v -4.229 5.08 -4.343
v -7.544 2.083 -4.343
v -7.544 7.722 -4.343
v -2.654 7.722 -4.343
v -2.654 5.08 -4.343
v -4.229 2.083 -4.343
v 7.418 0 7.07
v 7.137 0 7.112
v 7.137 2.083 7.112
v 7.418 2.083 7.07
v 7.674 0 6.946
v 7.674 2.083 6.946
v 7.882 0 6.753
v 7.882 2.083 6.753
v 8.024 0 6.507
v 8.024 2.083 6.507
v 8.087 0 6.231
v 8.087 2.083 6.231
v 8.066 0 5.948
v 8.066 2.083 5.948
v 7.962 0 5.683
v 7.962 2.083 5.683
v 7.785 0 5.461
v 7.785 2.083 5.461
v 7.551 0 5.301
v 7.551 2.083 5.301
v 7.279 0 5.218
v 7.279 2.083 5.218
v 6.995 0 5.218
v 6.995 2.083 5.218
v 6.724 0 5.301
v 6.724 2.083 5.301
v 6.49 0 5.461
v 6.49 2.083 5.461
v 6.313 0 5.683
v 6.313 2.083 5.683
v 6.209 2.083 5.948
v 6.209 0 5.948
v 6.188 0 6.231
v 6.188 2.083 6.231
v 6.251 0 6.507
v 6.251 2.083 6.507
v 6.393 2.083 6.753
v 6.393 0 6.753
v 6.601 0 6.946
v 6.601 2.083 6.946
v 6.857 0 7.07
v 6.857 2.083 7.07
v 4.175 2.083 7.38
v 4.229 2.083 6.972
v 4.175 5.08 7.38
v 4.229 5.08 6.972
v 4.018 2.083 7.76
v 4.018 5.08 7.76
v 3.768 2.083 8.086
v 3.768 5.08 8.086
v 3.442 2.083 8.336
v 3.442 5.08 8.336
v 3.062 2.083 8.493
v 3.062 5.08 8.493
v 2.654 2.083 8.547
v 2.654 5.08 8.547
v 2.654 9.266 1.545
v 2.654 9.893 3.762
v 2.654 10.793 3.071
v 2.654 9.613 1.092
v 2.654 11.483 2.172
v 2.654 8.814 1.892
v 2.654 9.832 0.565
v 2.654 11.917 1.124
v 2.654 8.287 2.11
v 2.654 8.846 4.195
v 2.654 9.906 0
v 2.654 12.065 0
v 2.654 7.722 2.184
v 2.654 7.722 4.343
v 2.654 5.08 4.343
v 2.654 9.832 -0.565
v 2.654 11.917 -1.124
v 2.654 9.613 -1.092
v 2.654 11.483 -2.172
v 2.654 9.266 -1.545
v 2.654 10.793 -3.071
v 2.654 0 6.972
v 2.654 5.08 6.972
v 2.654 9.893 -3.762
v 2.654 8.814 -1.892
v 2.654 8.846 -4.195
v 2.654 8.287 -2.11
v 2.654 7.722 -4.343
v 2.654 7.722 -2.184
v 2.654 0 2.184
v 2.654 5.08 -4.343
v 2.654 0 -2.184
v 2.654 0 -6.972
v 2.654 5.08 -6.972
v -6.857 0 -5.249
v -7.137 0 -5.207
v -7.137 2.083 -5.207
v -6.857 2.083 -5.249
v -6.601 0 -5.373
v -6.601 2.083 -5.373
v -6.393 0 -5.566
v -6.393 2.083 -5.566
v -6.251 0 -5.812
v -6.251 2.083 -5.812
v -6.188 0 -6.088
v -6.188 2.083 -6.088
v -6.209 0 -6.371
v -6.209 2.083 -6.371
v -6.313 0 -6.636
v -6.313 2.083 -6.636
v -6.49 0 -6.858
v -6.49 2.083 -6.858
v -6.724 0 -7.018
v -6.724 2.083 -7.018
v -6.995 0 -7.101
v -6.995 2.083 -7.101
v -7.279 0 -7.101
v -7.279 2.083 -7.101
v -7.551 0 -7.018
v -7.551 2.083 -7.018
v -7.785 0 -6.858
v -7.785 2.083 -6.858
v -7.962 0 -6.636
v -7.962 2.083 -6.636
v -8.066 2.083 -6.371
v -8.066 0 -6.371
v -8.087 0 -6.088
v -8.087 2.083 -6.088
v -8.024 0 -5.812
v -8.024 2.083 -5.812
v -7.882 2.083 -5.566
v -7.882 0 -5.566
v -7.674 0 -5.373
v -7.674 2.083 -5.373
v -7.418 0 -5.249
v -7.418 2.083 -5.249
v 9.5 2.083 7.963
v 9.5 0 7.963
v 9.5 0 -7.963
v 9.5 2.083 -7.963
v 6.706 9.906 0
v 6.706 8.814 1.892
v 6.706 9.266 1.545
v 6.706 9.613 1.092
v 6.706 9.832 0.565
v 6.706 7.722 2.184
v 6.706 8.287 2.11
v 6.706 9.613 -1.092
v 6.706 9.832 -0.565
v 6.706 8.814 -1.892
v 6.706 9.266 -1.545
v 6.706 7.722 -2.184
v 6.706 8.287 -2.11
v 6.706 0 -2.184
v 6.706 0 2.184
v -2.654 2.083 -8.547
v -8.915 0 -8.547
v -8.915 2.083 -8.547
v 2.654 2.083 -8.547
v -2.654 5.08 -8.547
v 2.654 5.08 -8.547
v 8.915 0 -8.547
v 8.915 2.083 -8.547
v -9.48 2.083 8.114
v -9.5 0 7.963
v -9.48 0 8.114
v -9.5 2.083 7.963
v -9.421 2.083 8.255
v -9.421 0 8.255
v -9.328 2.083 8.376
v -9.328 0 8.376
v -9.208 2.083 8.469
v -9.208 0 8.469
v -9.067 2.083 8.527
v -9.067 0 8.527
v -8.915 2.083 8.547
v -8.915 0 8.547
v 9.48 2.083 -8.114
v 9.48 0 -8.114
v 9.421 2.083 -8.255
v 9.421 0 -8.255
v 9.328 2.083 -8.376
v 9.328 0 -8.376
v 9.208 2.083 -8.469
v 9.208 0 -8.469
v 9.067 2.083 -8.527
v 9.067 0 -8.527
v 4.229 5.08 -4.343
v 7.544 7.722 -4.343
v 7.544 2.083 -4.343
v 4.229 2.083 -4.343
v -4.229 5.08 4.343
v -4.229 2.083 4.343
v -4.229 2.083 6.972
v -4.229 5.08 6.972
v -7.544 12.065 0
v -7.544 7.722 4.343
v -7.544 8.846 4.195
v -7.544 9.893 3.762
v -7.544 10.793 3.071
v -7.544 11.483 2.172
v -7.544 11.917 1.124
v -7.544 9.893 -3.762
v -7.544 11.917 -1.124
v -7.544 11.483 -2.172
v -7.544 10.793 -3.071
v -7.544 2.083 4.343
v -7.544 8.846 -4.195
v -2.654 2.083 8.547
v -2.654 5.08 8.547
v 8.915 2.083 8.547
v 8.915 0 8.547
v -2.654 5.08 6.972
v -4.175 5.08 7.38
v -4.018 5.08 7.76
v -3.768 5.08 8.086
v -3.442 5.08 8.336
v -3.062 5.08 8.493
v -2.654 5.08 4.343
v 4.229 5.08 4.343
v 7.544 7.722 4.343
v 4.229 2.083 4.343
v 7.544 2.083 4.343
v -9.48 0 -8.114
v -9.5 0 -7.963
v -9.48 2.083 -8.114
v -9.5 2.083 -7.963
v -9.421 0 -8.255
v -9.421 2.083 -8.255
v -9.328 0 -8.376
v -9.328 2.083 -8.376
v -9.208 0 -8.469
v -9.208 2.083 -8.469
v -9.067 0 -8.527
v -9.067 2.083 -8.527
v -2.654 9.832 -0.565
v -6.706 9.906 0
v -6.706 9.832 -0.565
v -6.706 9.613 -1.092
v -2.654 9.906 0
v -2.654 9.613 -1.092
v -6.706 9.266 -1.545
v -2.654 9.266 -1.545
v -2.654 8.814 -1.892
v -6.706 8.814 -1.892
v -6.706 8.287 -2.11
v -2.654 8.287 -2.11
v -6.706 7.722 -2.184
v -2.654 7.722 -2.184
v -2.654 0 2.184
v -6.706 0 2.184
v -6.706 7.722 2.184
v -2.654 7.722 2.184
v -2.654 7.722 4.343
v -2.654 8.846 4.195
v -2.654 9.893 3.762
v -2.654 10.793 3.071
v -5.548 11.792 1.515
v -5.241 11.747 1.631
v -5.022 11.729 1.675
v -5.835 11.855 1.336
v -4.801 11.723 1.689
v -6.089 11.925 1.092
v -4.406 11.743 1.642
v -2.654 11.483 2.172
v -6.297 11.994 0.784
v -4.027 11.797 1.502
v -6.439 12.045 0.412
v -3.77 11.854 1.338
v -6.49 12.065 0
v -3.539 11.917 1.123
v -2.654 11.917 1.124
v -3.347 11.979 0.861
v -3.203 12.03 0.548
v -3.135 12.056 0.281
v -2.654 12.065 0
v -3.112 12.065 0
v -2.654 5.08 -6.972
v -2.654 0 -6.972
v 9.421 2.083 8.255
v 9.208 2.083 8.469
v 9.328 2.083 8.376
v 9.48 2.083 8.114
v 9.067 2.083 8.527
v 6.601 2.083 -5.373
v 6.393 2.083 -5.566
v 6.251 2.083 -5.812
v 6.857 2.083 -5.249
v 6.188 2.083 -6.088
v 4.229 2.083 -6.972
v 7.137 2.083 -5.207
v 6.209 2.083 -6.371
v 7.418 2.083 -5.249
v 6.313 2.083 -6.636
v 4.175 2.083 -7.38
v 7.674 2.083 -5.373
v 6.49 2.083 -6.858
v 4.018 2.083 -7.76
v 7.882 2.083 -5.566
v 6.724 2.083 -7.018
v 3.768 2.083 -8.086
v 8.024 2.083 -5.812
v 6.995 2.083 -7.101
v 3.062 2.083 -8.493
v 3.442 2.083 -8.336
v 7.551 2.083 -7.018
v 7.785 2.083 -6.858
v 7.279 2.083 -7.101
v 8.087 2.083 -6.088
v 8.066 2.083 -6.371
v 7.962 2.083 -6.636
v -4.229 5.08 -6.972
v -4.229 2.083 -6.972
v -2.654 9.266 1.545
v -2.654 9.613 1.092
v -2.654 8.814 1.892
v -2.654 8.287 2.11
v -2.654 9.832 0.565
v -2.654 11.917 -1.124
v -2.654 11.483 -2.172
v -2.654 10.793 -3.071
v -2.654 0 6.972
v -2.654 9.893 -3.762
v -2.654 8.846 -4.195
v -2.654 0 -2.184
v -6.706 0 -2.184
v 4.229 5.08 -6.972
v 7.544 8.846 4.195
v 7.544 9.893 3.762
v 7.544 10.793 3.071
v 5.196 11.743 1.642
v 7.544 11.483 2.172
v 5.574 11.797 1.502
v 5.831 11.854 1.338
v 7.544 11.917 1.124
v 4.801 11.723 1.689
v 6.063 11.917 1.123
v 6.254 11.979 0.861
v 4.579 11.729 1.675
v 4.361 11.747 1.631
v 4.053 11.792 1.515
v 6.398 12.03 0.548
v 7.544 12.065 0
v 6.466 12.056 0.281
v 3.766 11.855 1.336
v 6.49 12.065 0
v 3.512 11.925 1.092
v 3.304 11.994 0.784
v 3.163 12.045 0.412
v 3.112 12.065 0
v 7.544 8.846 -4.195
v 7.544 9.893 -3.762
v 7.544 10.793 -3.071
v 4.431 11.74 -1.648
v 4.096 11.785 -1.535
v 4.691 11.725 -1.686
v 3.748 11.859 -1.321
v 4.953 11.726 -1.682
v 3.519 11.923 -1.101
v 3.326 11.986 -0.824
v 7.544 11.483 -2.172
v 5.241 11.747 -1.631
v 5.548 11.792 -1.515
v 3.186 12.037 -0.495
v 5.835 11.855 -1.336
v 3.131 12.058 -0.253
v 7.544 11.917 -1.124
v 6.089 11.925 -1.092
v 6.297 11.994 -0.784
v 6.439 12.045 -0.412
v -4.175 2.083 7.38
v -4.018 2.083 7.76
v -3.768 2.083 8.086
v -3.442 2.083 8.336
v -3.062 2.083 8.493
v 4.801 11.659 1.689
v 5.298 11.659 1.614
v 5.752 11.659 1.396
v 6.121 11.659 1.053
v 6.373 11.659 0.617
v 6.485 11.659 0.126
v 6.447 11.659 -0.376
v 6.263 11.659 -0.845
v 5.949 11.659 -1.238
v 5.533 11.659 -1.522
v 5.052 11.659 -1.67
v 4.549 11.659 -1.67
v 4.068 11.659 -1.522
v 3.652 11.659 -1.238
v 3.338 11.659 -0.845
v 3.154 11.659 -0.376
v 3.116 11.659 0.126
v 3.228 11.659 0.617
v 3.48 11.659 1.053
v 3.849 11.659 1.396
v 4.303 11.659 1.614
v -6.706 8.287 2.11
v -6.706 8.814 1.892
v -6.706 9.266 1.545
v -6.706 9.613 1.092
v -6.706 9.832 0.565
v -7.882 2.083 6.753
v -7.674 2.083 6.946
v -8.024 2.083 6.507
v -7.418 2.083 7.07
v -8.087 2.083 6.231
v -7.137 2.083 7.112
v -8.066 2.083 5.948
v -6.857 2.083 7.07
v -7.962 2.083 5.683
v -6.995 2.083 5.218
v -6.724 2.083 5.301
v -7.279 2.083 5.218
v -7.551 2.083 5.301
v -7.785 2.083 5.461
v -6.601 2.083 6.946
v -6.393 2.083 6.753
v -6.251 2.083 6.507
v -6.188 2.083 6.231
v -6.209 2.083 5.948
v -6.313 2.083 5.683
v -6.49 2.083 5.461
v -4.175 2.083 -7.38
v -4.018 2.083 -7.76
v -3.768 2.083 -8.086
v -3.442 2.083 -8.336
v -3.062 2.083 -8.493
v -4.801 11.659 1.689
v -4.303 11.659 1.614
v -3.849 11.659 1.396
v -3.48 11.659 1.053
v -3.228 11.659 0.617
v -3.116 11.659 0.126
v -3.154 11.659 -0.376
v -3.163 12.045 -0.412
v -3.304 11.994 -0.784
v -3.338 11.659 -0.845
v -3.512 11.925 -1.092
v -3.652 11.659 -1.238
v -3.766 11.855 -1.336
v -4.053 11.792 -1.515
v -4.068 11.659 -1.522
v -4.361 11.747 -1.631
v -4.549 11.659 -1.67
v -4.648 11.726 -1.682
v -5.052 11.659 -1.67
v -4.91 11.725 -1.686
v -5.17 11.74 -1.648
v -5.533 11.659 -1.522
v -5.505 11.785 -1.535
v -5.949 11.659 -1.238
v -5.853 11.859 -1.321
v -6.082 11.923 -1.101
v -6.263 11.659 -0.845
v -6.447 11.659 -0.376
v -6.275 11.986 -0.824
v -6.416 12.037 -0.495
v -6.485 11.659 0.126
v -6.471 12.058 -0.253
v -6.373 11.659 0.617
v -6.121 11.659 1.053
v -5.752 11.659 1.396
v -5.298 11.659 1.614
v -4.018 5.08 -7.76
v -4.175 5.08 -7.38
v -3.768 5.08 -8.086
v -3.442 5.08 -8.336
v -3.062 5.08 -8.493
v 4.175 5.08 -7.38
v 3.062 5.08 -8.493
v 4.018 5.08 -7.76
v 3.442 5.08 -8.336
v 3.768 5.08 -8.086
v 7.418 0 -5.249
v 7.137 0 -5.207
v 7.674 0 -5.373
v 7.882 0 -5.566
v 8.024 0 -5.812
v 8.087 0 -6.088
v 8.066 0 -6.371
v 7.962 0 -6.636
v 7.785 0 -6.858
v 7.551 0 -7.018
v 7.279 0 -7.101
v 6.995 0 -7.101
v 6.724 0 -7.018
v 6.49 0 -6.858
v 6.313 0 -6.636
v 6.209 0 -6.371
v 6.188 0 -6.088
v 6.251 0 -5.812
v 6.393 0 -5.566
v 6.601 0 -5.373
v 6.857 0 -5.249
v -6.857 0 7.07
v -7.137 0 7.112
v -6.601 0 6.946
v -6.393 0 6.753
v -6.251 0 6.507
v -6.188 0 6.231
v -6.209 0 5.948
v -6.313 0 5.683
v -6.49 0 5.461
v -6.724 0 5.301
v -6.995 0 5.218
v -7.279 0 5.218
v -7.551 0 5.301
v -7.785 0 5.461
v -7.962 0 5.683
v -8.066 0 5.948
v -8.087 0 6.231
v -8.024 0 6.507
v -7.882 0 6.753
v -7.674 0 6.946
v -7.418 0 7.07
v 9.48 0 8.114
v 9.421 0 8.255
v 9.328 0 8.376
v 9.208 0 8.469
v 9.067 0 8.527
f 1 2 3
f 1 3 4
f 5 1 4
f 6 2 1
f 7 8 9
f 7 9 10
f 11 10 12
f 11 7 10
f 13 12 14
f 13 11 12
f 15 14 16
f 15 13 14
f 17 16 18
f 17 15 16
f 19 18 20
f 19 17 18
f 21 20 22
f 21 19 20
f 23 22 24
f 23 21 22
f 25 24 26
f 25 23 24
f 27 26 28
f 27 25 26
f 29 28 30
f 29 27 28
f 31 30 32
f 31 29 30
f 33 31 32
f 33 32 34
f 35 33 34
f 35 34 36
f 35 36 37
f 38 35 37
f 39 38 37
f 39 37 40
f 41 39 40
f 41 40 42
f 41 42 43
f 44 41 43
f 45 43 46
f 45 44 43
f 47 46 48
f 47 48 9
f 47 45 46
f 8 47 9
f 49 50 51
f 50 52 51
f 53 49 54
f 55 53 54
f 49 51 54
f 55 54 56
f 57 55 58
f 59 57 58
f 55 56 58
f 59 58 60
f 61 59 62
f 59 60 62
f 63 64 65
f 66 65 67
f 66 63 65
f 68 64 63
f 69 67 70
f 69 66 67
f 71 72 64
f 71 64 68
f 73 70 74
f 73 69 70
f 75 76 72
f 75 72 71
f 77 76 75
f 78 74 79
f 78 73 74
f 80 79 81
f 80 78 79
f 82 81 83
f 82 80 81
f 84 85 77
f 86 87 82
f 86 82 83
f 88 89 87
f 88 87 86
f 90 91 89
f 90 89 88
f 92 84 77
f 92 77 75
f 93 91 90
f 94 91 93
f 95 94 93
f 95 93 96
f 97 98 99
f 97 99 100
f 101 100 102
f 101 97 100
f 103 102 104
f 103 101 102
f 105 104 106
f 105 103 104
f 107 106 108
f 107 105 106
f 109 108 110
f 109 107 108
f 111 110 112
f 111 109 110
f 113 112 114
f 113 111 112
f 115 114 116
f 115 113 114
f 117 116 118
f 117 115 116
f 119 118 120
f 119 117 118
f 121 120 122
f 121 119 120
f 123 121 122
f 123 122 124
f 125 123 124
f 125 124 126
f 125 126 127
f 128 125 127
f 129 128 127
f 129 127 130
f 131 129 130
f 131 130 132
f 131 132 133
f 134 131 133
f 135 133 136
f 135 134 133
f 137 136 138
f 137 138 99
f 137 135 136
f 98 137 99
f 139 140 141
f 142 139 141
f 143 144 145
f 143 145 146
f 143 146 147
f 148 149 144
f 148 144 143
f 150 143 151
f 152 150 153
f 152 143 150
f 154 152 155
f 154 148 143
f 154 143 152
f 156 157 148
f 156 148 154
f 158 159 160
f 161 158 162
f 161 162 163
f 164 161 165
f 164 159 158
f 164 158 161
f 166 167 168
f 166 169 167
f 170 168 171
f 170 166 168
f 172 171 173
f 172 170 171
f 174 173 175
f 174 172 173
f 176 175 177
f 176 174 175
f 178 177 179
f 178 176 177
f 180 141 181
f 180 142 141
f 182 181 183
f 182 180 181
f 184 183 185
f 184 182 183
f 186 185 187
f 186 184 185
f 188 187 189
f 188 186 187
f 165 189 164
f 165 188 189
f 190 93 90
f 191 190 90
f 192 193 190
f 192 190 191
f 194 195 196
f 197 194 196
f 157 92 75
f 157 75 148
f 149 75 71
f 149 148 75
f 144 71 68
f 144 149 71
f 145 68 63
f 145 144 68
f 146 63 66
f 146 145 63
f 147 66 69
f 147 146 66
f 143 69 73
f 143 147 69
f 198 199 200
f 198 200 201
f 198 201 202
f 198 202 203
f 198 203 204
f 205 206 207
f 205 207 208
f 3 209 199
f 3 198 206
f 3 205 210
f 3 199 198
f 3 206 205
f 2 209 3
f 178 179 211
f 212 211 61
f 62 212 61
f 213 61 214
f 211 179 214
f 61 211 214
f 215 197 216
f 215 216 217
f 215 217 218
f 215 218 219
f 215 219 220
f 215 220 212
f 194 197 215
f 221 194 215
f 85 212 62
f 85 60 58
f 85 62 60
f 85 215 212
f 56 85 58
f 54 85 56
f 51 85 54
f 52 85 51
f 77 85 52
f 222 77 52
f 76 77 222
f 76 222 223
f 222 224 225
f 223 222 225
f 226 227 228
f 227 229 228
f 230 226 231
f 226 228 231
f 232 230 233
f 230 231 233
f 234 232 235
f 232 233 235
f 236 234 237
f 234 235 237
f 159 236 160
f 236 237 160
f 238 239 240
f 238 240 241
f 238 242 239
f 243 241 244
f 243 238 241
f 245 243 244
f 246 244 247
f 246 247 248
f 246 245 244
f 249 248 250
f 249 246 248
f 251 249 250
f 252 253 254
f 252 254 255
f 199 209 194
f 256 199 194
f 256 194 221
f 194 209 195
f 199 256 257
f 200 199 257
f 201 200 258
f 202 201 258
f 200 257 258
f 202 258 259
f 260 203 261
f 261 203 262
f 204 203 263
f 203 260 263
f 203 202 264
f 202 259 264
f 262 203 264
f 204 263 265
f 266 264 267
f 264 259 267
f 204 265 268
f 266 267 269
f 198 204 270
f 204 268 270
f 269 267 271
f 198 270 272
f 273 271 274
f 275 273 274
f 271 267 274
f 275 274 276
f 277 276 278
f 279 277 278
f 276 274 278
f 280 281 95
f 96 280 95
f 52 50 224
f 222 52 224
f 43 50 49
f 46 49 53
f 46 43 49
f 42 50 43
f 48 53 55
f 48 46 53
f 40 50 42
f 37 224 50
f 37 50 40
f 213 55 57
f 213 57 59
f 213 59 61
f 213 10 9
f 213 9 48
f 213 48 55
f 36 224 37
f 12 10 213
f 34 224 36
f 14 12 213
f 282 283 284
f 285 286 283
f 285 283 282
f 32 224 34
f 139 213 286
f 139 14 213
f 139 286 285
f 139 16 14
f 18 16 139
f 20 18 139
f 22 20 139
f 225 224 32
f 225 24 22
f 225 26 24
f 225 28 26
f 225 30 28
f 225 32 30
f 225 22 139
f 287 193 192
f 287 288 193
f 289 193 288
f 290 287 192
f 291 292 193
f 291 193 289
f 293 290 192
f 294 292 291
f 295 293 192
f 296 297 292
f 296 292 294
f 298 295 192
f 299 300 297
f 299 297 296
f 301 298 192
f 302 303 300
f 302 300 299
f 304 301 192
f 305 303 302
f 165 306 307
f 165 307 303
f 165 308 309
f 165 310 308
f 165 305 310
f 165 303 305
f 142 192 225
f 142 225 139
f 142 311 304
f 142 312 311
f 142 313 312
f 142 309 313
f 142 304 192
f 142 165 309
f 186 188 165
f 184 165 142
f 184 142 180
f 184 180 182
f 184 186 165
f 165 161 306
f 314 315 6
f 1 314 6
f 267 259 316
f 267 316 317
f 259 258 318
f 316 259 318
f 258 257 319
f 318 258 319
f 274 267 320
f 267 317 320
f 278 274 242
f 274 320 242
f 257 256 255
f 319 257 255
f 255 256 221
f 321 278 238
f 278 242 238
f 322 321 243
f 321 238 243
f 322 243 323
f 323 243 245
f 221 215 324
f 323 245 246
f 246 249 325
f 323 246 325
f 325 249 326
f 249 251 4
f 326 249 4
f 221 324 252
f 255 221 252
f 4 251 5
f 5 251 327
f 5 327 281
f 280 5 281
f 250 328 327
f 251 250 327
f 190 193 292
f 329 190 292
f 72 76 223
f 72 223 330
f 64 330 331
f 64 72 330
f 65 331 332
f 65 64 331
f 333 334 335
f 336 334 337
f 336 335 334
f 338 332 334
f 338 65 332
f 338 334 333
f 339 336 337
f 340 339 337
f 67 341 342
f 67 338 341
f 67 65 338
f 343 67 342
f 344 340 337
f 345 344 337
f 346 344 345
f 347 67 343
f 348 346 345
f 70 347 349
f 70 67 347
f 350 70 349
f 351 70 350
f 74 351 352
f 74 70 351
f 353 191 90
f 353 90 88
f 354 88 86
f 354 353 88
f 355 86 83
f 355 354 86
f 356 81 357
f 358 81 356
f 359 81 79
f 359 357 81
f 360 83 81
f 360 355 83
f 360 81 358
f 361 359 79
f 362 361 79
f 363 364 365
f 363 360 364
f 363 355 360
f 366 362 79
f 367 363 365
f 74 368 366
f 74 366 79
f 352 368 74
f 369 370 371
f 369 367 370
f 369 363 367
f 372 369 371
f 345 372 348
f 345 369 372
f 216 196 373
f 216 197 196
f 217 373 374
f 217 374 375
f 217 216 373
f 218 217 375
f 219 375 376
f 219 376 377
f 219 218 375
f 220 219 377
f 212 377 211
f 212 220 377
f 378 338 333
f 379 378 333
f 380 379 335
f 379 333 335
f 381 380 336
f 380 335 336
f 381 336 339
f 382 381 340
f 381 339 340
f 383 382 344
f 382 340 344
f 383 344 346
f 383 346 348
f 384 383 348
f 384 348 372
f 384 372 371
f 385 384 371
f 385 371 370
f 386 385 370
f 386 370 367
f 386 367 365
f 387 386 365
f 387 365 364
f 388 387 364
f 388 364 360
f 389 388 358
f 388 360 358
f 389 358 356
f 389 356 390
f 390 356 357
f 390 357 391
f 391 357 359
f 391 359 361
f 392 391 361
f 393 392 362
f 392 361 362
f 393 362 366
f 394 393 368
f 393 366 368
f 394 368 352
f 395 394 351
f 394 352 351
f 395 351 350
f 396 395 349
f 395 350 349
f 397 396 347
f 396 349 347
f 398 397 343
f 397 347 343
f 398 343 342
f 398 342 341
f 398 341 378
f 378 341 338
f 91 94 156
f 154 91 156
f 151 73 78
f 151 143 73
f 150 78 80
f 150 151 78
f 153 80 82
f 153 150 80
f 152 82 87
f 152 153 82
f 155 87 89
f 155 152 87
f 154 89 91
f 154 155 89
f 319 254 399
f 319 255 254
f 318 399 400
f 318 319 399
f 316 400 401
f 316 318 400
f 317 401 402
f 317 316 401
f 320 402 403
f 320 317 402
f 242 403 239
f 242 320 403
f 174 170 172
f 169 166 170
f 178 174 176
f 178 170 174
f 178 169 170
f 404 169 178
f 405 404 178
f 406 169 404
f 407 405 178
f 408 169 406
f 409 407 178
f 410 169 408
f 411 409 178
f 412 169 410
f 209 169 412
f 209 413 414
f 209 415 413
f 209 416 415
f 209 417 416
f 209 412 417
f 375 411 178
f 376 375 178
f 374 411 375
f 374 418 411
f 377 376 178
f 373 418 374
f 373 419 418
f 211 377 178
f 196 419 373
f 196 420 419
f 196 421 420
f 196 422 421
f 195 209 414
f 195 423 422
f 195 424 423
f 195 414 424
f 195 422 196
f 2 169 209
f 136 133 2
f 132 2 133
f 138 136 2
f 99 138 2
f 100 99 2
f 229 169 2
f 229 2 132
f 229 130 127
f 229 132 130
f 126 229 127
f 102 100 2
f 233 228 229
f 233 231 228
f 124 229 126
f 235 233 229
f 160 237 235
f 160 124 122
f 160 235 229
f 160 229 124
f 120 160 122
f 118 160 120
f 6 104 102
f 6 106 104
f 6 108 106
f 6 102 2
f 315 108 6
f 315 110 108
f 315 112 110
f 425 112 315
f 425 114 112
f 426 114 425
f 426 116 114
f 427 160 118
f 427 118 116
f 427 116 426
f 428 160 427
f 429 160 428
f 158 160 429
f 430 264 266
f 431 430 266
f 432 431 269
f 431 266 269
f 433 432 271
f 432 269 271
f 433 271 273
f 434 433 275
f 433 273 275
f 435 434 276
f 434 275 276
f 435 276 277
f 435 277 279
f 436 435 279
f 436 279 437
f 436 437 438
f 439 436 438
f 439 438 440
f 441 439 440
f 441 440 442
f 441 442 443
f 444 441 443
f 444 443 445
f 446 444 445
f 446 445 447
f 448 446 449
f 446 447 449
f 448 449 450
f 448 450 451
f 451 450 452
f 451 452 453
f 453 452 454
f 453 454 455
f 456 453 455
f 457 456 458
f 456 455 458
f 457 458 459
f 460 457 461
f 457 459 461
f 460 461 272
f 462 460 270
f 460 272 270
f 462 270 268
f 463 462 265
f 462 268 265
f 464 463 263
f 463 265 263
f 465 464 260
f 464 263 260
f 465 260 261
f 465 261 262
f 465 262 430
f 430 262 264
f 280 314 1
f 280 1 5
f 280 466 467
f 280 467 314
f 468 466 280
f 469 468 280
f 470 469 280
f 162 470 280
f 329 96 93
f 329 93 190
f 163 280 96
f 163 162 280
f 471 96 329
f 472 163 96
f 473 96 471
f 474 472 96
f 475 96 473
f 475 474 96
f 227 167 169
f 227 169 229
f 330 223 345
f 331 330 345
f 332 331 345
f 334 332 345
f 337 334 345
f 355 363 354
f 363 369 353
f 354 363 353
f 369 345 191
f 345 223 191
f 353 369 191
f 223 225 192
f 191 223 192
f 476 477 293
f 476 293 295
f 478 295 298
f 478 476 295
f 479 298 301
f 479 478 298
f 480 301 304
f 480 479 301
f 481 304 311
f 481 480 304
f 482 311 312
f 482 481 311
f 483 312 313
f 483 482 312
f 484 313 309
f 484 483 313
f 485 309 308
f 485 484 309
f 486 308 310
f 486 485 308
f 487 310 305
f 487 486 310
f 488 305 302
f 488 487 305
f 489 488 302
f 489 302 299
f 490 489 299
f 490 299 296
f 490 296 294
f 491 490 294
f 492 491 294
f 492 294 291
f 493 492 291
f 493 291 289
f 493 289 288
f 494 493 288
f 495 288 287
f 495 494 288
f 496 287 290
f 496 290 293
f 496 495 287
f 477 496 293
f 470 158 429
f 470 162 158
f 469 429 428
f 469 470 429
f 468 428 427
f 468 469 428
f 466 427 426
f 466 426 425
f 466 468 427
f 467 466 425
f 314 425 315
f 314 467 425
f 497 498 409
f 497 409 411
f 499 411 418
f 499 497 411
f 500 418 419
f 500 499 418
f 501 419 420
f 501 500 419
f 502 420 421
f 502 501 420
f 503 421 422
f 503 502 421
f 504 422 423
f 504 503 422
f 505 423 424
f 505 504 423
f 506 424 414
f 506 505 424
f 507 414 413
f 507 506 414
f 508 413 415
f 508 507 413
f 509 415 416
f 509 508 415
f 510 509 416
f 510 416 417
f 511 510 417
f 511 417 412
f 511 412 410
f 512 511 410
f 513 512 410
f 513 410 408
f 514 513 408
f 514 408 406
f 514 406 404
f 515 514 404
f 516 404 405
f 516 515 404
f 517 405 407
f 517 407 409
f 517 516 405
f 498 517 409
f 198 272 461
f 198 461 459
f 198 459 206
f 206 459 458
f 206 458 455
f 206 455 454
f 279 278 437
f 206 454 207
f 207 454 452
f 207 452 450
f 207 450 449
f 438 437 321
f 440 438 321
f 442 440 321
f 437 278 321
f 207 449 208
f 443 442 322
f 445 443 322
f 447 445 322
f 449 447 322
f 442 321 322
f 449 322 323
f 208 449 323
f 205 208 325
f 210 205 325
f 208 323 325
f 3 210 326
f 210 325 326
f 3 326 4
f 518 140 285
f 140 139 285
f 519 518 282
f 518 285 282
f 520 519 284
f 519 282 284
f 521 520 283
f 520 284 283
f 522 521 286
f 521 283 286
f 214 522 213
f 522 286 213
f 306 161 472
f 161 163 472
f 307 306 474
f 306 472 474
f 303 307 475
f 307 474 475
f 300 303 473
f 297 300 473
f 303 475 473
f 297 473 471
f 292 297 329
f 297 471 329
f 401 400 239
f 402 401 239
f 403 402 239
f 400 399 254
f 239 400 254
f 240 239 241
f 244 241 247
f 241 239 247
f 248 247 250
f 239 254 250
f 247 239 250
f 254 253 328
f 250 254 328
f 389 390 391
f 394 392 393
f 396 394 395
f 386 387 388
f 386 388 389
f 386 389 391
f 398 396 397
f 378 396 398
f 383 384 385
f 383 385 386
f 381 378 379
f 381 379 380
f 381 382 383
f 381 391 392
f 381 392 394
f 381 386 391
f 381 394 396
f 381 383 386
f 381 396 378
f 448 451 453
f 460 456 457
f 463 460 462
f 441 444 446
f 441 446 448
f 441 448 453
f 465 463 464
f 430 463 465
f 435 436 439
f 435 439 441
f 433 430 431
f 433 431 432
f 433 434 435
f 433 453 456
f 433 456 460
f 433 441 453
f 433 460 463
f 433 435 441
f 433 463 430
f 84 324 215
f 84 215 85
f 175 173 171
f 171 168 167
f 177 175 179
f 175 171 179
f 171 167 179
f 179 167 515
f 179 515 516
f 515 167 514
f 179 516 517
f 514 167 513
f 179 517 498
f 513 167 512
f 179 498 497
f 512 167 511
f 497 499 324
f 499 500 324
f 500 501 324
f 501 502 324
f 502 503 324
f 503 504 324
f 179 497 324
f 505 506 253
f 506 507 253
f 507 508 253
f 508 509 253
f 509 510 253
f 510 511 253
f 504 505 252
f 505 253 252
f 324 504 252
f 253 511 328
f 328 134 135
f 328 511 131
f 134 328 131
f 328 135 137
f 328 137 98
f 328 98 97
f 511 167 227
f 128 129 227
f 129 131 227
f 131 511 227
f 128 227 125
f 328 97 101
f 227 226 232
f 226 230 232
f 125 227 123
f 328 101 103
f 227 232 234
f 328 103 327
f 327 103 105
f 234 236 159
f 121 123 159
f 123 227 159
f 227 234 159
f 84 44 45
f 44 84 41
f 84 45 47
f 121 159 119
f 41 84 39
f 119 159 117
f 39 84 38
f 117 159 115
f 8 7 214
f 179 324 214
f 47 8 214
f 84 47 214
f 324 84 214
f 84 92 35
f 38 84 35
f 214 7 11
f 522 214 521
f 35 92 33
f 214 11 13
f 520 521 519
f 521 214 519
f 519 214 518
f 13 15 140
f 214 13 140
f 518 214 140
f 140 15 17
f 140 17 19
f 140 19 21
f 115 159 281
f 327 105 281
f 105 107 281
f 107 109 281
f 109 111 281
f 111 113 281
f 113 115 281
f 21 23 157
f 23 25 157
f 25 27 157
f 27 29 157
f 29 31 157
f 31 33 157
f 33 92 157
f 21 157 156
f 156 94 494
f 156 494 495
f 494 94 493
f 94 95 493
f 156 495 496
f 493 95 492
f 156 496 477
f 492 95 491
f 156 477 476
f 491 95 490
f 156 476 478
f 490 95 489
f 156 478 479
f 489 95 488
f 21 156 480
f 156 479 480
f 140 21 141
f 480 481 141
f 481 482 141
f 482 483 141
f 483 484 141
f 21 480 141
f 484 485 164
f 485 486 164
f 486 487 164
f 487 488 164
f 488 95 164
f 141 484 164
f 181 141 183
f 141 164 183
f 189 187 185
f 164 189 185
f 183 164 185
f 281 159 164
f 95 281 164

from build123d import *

# Parameters (mm, degrees)
SKETCH2_W           = 18.9992
SKETCH2_H           = 17.0942
SKETCH2_R           = 0.9525
BOSS_EXTRUDE1_DEPTH = 2.0828
BOSS_EXTRUDE2_START = 2.0828
SKETCH2_3_W         = 1.5748
SKETCH2_3_H         = 8.6868
SKETCH2_3_W_2       = 5.3086
SKETCH2_3_H_2       = 2.6289
BOSS_EXTRUDE2_DEPTH = 2.9972
BOSS_EXTRUDE3_START = 2.0828
SKETCH2_4_W         = 3.3147
SKETCH2_4_H         = 8.6868
BOSS_EXTRUDE3_DEPTH = 9.9822
BOSS_EXTRUDE4_START = 2.0828
SKETCH2_6_W         = 1.5748
SKETCH2_6_H         = 8.6868
BOSS_EXTRUDE4_DEPTH = 9.9822
CUT_EXTRUDE1_REACH  = 19.574
SKETCH2_5_W         = 5.3086
SKETCH2_5_H         = 2.6289
SKETCH2_5_H_2       = 8.6868
SKETCH4_W           = 13.4112
SKETCH4_H           = 4.3688
CUT_EXTRUDE2_DEPTH  = 9.906
FILLET1_R           = 2.1844
FILLET2_R           = 4.3434
FILLET3_R           = 1.5748
FILLET4_R           = 0.5842
SKETCH6_R           = 1.6891
CUT_EXTRUDE3_DEPTH  = 0.4064


with BuildPart() as part:
    # Sketch2 → Boss-Extrude1 (new body)
    with BuildSketch(Plane(origin=(0, 0, 0), x_dir=(1, 0, 0), z_dir=(0, 1, 0))):
        Rectangle(SKETCH2_W, SKETCH2_H)
        with Locations(Location((-7.1374, -6.1595, 0), (0, 0, 270))):
            Circle(SKETCH2_R, mode=Mode.SUBTRACT)
        with Locations(Location((-7.1374, 6.1595, 0), (0, 0, 270))):
            Circle(SKETCH2_R, mode=Mode.SUBTRACT)
        with Locations(Location((7.1374, 6.1595, 0), (0, 0, 270))):
            Circle(SKETCH2_R, mode=Mode.SUBTRACT)
        with Locations(Location((7.1374, -6.1595, 0), (0, 0, 270))):
            Circle(SKETCH2_R, mode=Mode.SUBTRACT)
    extrude(amount=BOSS_EXTRUDE1_DEPTH)

    # Sketch2<3> → Boss-Extrude2 (add)
    with BuildSketch(Plane(origin=(0, 0, 0), x_dir=(1, 0, 0), z_dir=(0, 1, 0)).offset(BOSS_EXTRUDE2_START)):
        Polygon((4.2291, 8.5471), (-4.2291, 8.5471), (-4.2291, 4.3434), (-2.6543, 4.3434), (-2.6543, 6.9723), (2.6543, 6.9723), (2.6543, 4.3434), (4.2291, 4.3434), align=None)
        with Locations((-3.4417, 0)):
            Rectangle(SKETCH2_3_W, SKETCH2_3_H)
        with Locations((3.4417, 0)):
            Rectangle(SKETCH2_3_W, SKETCH2_3_H)
        Polygon((-4.2291, -4.3434), (-4.2291, -8.5471), (4.2291, -8.5471), (4.2291, -4.3434), (2.6543, -4.3434), (2.6543, -6.9723), (-2.6543, -6.9723), (-2.6543, -4.3434), align=None)
        with Locations((0, 5.65785)):
            Rectangle(SKETCH2_3_W_2, SKETCH2_3_H_2)
        Rectangle(SKETCH2_3_W_2, SKETCH2_3_H)
        with Locations((0, -5.65785)):
            Rectangle(SKETCH2_3_W_2, SKETCH2_3_H_2)
    extrude(amount=BOSS_EXTRUDE2_DEPTH)

    # Sketch2<4> → Boss-Extrude3 (add)
    with BuildSketch(Plane(origin=(0, 0, 0), x_dir=(1, 0, 0), z_dir=(0, 1, 0)).offset(BOSS_EXTRUDE3_START)):
        with Locations((5.88645, 0)):
            Rectangle(SKETCH2_4_W, SKETCH2_4_H)
        with Locations((-5.88645, 0)):
            Rectangle(SKETCH2_4_W, SKETCH2_4_H)
    extrude(amount=BOSS_EXTRUDE3_DEPTH)

    # Sketch2<6> → Boss-Extrude4 (add)
    with BuildSketch(Plane(origin=(0, 0, 0), x_dir=(1, 0, 0), z_dir=(0, 1, 0)).offset(BOSS_EXTRUDE4_START)):
        with Locations((-3.4417, 0)):
            Rectangle(SKETCH2_6_W, SKETCH2_6_H)
        with Locations((3.4417, 0)):
            Rectangle(SKETCH2_6_W, SKETCH2_6_H)
    extrude(amount=BOSS_EXTRUDE4_DEPTH)

    # Sketch2<5> → Cut-Extrude1 (cut, up to next)
    with BuildSketch(Plane(origin=(0, 0, 0), x_dir=(1, 0, 0), z_dir=(0, 1, 0)), mode=Mode.PRIVATE) as cut_extrude1_sk1:
        with Locations((0, 5.65785)):
            Rectangle(SKETCH2_5_W, SKETCH2_5_H)
    cut_extrude1_tool1 = extrude(cut_extrude1_sk1.sketch, amount=CUT_EXTRUDE1_REACH, mode=Mode.PRIVATE) & part.part
    # Sketch2<5> → Cut-Extrude1 (cut, up to next)
    with BuildSketch(Plane(origin=(0, 0, 0), x_dir=(1, 0, 0), z_dir=(0, 1, 0)), mode=Mode.PRIVATE) as cut_extrude1_sk2:
        Rectangle(SKETCH2_5_W, SKETCH2_5_H_2)
    cut_extrude1_tool2 = extrude(cut_extrude1_sk2.sketch, amount=CUT_EXTRUDE1_REACH, mode=Mode.PRIVATE) & part.part
    # Sketch2<5> → Cut-Extrude1 (cut, up to next)
    with BuildSketch(Plane(origin=(0, 0, 0), x_dir=(1, 0, 0), z_dir=(0, 1, 0)), mode=Mode.PRIVATE) as cut_extrude1_sk3:
        with Locations((0, -5.65785)):
            Rectangle(SKETCH2_5_W, SKETCH2_5_H)
    cut_extrude1_tool3 = extrude(cut_extrude1_sk3.sketch, amount=CUT_EXTRUDE1_REACH, mode=Mode.PRIVATE) & part.part
    add(cut_extrude1_tool1.solids().sort_by_distance((0, 0, -5.65785))[0], mode=Mode.SUBTRACT)
    add(cut_extrude1_tool2.solids().sort_by_distance((0, 0, 0))[0], mode=Mode.SUBTRACT)
    add(cut_extrude1_tool3.solids().sort_by_distance((0, 0, 5.65785))[0], mode=Mode.SUBTRACT)

    # Sketch4 → Cut-Extrude2 (cut)
    with BuildSketch(Plane(origin=(0, 0, 0), x_dir=(1, 0, 0), z_dir=(0, 1, 0))):
        Rectangle(SKETCH4_W, SKETCH4_H)
    extrude(amount=CUT_EXTRUDE2_DEPTH, mode=Mode.SUBTRACT)

    # Fillet1
    fillet1_edges = [part.edges().sort_by_distance(p)[0] for p in [
        (4.67995, 9.906, -2.1844),
        (4.67995, 9.906, 2.1844),
        (-4.67995, 9.906, 2.1844),
        (-4.67995, 9.906, -2.1844),
    ]]
    fillet(fillet1_edges, radius=FILLET1_R - 0.0001)  # a hair under: the kernel refuses the full size

    # Fillet2
    fillet2_edges = [part.edges().sort_by_distance(p)[0] for p in [
        (-5.09905, 12.065, 4.3434),
        (-5.09905, 12.065, -4.3434),
        (5.09905, 12.065, 4.3434),
        (5.09905, 12.065, -4.3434),
    ]]
    fillet(fillet2_edges, radius=FILLET2_R - 0.0001)  # a hair under: the kernel refuses the full size

    # Fillet3
    fillet3_edges = [part.edges().sort_by_distance(p)[0] for p in [
        (4.2291, 3.5814, 8.5471),
        (4.2291, 3.5814, -8.5471),
        (-4.2291, 3.5814, -8.5471),
        (-4.2291, 3.5814, 8.5471),
    ]]
    fillet(fillet3_edges, radius=FILLET3_R)

    # Fillet4
    fillet4_edges = [part.edges().sort_by_distance(p)[0] for p in [
        (9.4996, 1.0414, 8.5471),
        (-9.4996, 1.0414, 8.5471),
        (-9.4996, 1.0414, -8.5471),
        (9.4996, 1.0414, -8.5471),
    ]]
    fillet(fillet4_edges, radius=FILLET4_R)

    # Sketch6 → Cut-Extrude3 (cut)
    with BuildSketch(Plane(origin=(0, 12.065, 0), x_dir=(1, 0, 0), z_dir=(0, 1, 0))):
        with Locations(Location((4.8006, 0, 0), (0, 0, 270))):
            Circle(SKETCH6_R)
        with Locations(Location((-4.8006, 0, 0), (0, 0, 270))):
            Circle(SKETCH6_R)
    extrude(amount=-CUT_EXTRUDE3_DEPTH, mode=Mode.SUBTRACT)


solid = part.part
